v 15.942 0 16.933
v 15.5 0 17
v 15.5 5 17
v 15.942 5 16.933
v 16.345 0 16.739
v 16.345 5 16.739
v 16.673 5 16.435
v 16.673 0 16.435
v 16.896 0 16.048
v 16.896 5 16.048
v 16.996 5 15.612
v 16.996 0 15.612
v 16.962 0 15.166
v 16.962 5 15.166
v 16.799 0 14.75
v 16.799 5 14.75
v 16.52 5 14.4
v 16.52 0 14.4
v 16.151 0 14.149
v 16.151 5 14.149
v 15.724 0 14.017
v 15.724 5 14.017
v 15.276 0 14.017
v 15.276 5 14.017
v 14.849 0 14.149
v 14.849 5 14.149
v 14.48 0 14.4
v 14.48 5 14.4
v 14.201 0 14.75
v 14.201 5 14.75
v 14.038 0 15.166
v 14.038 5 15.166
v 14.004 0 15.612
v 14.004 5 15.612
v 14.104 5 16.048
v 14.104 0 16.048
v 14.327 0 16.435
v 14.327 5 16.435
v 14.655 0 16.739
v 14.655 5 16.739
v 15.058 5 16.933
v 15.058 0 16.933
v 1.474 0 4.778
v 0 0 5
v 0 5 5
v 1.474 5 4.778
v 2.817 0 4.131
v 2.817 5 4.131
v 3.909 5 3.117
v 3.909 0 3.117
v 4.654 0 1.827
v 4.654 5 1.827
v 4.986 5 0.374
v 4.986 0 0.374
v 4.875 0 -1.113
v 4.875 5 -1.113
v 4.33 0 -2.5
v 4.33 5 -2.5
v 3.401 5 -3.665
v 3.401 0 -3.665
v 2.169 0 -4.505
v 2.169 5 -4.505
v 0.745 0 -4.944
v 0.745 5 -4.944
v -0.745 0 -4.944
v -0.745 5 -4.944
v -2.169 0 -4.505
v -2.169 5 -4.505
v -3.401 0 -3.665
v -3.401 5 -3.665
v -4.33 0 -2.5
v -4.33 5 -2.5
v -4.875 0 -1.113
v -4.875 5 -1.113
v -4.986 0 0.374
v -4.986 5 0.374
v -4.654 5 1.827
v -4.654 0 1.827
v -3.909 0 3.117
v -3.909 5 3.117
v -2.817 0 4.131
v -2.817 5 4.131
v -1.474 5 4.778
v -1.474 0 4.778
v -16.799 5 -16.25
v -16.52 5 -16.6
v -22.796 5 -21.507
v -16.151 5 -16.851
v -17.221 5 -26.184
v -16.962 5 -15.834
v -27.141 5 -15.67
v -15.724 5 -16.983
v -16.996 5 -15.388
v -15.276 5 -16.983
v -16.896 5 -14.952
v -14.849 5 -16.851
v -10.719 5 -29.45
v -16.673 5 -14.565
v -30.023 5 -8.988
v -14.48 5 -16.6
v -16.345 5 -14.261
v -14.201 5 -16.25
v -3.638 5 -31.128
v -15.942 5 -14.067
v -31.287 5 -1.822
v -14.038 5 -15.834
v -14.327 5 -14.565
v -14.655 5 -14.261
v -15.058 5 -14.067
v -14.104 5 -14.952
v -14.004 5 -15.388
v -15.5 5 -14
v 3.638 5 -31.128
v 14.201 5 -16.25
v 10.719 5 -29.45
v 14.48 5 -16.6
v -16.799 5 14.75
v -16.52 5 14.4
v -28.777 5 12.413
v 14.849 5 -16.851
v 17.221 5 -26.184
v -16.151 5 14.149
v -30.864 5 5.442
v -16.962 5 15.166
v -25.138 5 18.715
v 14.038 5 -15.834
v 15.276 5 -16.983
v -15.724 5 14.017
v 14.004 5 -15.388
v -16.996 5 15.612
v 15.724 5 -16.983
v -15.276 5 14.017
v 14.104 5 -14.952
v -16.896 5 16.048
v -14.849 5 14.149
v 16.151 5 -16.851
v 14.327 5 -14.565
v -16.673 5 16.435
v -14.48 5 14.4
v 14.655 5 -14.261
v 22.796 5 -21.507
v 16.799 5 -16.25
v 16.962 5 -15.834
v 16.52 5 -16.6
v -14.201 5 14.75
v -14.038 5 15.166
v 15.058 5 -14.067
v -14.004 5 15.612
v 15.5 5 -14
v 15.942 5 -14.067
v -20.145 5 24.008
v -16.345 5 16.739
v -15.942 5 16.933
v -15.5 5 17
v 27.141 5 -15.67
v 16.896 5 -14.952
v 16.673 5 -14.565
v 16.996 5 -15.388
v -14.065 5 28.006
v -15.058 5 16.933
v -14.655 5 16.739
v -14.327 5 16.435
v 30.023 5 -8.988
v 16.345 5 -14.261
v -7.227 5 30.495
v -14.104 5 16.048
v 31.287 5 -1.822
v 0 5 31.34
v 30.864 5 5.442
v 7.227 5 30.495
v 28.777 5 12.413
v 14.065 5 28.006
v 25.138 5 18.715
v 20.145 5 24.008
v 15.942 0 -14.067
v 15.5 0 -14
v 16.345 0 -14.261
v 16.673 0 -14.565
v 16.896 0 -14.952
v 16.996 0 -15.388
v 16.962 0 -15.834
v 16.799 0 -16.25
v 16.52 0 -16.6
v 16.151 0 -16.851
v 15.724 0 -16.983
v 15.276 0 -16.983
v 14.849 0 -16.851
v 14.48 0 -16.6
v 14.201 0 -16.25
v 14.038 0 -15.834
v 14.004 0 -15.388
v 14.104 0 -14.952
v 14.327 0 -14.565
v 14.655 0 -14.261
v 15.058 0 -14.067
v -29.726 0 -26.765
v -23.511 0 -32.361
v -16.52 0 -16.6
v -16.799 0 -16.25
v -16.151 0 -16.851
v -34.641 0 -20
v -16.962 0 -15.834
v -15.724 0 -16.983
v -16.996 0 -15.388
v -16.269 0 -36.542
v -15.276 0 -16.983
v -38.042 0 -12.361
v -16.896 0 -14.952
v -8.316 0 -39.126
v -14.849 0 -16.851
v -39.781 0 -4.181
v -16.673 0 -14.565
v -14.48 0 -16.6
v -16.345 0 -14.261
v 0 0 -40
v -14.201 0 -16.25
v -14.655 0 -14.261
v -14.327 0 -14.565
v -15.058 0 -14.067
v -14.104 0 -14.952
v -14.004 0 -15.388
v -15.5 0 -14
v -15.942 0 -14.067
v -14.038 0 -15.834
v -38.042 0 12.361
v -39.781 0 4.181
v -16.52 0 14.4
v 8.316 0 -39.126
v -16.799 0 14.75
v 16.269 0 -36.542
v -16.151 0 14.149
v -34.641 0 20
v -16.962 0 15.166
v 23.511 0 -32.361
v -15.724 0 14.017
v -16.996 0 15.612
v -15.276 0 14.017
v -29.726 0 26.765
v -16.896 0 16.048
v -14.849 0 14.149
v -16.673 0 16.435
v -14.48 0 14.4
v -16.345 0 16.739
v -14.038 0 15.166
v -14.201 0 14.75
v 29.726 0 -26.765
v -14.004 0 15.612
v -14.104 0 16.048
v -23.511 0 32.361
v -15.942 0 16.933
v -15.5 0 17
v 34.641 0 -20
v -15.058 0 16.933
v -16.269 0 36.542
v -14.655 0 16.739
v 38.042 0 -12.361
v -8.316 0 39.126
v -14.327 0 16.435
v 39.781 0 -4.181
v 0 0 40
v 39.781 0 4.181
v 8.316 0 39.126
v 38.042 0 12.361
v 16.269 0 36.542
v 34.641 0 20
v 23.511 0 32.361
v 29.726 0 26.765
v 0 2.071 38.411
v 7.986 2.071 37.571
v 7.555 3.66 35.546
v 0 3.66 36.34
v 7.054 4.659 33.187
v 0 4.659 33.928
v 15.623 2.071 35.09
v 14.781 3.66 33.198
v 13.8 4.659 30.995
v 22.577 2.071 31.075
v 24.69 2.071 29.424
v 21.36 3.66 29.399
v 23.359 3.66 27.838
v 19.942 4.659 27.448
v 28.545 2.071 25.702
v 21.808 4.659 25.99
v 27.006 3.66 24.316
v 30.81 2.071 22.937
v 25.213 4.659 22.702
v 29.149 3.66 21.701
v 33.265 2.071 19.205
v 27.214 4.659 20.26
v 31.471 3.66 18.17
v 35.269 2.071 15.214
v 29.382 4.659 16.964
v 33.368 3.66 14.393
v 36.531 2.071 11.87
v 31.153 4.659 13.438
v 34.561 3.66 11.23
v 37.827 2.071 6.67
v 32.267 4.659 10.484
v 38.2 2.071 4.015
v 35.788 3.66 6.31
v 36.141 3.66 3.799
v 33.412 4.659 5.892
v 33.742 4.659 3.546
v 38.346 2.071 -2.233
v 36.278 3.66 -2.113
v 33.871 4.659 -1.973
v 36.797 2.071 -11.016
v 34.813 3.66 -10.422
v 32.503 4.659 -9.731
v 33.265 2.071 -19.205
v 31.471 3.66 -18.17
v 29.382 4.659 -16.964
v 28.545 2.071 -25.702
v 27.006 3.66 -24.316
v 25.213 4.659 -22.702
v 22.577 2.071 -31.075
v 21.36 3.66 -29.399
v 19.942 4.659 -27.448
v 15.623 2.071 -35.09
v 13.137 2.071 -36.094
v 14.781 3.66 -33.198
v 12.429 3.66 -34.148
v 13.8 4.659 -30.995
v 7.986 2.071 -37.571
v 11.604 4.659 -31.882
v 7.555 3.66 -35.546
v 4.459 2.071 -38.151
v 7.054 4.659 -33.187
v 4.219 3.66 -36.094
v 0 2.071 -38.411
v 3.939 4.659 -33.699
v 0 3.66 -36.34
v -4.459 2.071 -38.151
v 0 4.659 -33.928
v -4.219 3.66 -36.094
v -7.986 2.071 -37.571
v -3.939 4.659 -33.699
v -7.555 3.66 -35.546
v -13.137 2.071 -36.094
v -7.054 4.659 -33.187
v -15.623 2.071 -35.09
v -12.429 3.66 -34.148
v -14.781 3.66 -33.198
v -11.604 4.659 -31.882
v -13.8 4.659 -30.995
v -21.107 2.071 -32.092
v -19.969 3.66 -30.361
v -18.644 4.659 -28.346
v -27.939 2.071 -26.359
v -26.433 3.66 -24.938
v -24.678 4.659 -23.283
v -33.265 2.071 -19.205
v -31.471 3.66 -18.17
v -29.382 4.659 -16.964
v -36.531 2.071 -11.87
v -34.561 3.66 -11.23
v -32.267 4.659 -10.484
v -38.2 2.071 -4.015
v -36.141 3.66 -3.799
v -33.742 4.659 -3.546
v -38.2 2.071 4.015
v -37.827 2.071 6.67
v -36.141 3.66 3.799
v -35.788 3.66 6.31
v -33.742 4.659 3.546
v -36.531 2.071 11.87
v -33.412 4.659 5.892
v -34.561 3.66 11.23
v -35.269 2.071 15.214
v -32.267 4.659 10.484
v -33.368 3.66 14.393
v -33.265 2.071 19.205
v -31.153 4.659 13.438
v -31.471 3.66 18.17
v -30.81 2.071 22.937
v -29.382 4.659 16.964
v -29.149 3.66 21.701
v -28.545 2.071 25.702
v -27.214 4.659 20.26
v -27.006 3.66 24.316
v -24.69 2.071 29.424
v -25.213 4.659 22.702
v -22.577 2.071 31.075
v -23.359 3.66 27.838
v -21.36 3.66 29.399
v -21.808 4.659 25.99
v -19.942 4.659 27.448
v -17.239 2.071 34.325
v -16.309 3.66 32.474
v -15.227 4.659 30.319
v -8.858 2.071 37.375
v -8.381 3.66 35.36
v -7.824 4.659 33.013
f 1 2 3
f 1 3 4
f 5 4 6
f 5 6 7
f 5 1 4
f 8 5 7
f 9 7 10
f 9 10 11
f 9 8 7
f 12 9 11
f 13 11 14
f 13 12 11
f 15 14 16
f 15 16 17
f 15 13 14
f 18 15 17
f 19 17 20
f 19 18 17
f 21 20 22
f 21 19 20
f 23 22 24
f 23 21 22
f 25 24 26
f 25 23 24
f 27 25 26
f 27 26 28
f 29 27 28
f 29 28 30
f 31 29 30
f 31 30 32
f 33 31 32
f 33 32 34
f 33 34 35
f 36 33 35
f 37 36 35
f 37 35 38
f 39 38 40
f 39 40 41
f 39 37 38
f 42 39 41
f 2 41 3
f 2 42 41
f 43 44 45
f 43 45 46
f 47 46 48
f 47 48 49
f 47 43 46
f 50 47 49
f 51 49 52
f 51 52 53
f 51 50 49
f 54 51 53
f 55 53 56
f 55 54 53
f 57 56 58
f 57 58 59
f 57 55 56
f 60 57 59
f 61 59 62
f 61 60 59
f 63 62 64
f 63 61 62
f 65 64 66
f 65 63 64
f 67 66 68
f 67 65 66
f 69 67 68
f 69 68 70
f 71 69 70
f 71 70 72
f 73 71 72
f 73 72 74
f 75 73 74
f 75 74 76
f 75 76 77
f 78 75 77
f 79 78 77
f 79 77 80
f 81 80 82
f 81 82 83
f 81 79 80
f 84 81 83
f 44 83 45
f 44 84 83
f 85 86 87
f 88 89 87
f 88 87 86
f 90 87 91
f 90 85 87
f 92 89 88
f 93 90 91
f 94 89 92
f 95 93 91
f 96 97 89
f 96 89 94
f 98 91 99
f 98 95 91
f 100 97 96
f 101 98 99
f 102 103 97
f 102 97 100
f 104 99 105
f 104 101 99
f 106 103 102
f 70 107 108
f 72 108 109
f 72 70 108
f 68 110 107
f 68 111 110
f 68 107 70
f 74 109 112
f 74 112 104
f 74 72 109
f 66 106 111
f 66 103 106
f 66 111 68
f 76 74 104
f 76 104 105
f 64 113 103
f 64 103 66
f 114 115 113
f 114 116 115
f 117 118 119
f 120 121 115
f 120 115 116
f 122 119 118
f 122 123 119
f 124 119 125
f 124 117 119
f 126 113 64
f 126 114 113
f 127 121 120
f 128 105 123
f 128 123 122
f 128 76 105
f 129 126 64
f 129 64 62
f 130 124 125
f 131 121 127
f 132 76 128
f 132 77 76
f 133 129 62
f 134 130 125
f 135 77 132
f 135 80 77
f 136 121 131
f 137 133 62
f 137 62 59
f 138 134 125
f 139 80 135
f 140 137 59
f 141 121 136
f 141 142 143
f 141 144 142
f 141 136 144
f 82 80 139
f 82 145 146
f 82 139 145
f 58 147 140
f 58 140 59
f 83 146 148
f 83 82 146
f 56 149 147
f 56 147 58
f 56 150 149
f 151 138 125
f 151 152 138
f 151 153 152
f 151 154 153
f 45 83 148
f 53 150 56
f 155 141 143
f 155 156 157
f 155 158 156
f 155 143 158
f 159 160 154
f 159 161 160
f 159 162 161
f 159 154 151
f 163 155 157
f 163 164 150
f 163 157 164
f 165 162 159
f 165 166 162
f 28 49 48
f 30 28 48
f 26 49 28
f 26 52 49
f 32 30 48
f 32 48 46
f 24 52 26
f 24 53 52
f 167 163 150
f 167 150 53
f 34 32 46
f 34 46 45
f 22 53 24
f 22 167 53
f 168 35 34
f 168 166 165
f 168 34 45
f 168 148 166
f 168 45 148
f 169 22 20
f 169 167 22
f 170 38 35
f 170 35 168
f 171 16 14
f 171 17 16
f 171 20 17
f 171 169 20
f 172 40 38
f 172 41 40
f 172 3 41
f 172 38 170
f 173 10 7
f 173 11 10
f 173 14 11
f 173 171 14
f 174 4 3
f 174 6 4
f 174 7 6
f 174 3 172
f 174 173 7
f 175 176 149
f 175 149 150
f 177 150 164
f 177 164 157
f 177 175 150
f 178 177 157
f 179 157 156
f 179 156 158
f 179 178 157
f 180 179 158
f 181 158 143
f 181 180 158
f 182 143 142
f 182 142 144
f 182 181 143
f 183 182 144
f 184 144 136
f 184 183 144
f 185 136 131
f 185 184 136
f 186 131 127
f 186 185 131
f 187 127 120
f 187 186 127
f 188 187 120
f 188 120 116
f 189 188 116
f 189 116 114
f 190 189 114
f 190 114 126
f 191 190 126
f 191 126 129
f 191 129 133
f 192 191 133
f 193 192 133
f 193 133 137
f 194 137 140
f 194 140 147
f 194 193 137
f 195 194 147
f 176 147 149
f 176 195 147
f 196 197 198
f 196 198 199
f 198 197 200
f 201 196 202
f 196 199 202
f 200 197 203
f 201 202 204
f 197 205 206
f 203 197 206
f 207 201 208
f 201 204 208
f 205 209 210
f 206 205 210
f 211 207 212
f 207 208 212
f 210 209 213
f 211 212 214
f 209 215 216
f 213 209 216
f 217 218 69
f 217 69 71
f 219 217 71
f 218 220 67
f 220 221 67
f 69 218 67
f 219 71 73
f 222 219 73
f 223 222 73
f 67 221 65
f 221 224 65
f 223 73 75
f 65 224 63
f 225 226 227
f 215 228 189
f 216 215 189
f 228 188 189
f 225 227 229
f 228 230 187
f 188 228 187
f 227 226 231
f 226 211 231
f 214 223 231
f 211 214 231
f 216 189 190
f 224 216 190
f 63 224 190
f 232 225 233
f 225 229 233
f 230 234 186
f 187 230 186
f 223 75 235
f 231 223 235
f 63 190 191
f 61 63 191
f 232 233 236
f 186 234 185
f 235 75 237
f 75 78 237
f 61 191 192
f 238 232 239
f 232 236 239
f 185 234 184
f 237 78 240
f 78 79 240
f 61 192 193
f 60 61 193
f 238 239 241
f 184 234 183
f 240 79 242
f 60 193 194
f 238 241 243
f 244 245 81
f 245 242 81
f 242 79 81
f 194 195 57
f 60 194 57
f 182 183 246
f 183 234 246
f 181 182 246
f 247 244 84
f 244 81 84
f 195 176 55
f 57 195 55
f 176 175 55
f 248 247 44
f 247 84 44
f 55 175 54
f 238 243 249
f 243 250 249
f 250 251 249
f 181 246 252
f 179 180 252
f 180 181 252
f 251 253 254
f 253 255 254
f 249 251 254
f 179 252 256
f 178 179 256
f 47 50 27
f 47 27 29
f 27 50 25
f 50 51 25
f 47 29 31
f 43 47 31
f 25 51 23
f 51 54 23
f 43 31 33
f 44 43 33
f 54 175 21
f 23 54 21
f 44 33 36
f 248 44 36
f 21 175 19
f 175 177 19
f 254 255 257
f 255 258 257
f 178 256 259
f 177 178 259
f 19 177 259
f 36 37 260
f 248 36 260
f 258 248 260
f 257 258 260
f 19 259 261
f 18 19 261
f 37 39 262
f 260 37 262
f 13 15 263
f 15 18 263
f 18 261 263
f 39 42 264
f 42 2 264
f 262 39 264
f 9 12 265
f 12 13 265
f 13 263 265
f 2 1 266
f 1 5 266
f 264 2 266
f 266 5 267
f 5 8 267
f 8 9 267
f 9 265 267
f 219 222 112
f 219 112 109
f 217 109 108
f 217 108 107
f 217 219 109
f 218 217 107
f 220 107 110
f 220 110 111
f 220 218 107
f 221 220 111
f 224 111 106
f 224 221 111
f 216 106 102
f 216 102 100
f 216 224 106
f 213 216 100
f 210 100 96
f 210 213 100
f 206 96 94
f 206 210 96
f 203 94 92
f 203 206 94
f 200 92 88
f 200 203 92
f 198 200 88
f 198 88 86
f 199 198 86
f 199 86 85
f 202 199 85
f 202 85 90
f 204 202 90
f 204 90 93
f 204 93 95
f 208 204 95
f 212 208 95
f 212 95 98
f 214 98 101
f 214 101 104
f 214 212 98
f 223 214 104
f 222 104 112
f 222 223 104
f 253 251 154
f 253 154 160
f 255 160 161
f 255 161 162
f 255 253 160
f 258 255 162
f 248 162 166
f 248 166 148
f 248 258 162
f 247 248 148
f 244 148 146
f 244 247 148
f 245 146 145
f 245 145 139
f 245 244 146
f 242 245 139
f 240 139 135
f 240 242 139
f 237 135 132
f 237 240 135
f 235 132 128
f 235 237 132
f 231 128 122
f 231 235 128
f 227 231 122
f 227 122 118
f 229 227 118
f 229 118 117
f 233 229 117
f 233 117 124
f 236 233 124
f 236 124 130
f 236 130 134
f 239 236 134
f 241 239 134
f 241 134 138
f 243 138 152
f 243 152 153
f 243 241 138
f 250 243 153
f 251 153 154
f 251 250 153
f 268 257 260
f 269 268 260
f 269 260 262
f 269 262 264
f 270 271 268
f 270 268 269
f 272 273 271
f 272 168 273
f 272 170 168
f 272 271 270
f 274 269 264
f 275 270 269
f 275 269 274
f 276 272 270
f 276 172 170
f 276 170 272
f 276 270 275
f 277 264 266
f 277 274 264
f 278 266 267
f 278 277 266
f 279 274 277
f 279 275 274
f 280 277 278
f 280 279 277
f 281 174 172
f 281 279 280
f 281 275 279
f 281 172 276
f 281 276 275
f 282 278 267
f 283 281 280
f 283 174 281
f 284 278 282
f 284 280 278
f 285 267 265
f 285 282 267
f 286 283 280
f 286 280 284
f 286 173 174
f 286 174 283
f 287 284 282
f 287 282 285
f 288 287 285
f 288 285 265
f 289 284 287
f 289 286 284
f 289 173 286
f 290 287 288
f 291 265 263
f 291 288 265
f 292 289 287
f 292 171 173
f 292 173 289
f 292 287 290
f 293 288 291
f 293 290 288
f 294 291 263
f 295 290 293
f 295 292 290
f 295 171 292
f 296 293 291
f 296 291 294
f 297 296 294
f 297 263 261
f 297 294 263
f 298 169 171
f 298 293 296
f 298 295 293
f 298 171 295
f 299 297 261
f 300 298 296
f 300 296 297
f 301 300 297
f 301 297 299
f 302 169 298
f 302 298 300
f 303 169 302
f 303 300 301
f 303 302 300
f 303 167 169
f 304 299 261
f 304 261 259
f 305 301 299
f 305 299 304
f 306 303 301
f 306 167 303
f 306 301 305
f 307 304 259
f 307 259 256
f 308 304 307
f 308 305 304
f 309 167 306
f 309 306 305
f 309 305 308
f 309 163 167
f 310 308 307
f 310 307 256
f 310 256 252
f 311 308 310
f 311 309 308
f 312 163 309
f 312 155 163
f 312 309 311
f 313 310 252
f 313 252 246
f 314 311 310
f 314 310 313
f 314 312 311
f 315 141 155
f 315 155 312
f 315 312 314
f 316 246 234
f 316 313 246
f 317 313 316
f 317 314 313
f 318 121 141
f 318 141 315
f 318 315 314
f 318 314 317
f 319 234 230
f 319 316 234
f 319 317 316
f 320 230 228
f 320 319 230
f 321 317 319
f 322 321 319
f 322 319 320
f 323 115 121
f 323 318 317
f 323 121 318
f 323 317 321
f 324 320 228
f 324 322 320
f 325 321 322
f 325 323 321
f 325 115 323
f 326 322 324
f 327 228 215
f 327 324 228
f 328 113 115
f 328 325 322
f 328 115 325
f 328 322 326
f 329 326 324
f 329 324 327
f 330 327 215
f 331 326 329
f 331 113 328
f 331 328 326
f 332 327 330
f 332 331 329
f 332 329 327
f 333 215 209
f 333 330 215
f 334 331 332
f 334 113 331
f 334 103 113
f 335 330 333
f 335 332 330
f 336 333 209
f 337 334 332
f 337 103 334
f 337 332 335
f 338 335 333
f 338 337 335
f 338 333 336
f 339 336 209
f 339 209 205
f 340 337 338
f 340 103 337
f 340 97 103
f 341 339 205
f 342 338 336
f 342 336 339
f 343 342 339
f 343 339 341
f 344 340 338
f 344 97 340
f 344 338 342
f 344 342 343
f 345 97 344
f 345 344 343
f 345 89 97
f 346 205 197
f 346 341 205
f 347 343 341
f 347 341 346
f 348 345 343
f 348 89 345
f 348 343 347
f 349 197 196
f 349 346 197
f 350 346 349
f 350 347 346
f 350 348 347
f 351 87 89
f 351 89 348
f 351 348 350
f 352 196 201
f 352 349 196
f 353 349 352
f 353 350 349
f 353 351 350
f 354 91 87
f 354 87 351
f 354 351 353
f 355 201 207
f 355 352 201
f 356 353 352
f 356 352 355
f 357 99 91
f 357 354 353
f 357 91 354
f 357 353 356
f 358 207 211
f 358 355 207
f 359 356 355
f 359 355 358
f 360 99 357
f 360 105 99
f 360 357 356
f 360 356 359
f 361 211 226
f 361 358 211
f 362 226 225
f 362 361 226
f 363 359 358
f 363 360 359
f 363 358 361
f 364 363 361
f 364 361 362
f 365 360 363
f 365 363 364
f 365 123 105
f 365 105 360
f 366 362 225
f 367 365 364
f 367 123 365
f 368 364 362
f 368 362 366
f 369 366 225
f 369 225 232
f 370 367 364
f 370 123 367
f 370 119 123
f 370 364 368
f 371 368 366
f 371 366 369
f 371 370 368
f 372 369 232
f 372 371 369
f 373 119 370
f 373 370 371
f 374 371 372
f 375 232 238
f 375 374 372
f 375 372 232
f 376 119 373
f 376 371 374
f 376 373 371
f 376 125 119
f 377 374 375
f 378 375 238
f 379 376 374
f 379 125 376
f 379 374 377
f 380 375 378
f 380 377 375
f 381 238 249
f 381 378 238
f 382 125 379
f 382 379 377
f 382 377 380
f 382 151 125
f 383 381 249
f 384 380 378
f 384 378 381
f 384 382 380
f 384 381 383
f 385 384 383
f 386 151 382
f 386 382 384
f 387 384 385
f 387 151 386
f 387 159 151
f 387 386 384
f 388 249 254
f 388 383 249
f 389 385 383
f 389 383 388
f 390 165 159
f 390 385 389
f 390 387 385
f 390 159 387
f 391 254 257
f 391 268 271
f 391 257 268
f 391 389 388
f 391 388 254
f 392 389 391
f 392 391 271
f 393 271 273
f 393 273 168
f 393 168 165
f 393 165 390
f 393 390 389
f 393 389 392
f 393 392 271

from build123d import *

# Parameters (mm, degrees)
SKETCH1_R           = 40
SKETCH1_R_2         = 1.5
SKETCH1_R_3         = 5
BOSS_EXTRUDE1_DEPTH = 5
FILLET2_R           = 10


with BuildPart() as part:
    # Sketch1 → Boss-Extrude1 (new body)
    with BuildSketch(Plane(origin=(0, 0, 0), x_dir=(1, 0, 0), z_dir=(0, 1, 0))):
        with Locations(Location((0, 0, 0), (0, 0, 270))):
            Circle(SKETCH1_R)
        with Locations(Location((-15.5, 15.5, 0), (0, 0, 270))):
            Circle(SKETCH1_R_2, mode=Mode.SUBTRACT)
        with Locations(Location((15.5, 15.5, 0), (0, 0, 270))):
            Circle(SKETCH1_R_2, mode=Mode.SUBTRACT)
        with Locations(Location((-15.5, -15.5, 0), (0, 0, 270))):
            Circle(SKETCH1_R_2, mode=Mode.SUBTRACT)
        with Locations(Location((15.5, -15.5, 0), (0, 0, 270))):
            Circle(SKETCH1_R_2, mode=Mode.SUBTRACT)
        with Locations(Location((0, 0, 0), (0, 0, 270))):
            Circle(SKETCH1_R_3, mode=Mode.SUBTRACT)
    extrude(amount=BOSS_EXTRUDE1_DEPTH)

    # Fillet2
    # the kernel refuses this fillet: 10 mm, written as the material it takes off along each edge
    with BuildSketch(Plane(origin=(0, 5, 0), x_dir=(0, 0, 1), z_dir=(-1, 0, 0))) as fillet2_piece_1:
        with BuildLine():
            CenterArc((31.339745962, -10), FILLET2_R, 30, 60)
            Line((31.339745962, 0), (31.339745962, 0.2))
            Line((31.339745962, 0.2), (40, 0.2))
            Line((40, 0.2), (40.2, 0))
            ThreePointArc((40.2, 0), (40.2, -2.5), (40.173205081, -4.9))
            Line((40.173205081, -4.9), (40, -5))
        make_face()
    revolve(axis=Axis((0, 5, 0), (0, 1, 0)), mode=Mode.SUBTRACT)


solid = part.part
